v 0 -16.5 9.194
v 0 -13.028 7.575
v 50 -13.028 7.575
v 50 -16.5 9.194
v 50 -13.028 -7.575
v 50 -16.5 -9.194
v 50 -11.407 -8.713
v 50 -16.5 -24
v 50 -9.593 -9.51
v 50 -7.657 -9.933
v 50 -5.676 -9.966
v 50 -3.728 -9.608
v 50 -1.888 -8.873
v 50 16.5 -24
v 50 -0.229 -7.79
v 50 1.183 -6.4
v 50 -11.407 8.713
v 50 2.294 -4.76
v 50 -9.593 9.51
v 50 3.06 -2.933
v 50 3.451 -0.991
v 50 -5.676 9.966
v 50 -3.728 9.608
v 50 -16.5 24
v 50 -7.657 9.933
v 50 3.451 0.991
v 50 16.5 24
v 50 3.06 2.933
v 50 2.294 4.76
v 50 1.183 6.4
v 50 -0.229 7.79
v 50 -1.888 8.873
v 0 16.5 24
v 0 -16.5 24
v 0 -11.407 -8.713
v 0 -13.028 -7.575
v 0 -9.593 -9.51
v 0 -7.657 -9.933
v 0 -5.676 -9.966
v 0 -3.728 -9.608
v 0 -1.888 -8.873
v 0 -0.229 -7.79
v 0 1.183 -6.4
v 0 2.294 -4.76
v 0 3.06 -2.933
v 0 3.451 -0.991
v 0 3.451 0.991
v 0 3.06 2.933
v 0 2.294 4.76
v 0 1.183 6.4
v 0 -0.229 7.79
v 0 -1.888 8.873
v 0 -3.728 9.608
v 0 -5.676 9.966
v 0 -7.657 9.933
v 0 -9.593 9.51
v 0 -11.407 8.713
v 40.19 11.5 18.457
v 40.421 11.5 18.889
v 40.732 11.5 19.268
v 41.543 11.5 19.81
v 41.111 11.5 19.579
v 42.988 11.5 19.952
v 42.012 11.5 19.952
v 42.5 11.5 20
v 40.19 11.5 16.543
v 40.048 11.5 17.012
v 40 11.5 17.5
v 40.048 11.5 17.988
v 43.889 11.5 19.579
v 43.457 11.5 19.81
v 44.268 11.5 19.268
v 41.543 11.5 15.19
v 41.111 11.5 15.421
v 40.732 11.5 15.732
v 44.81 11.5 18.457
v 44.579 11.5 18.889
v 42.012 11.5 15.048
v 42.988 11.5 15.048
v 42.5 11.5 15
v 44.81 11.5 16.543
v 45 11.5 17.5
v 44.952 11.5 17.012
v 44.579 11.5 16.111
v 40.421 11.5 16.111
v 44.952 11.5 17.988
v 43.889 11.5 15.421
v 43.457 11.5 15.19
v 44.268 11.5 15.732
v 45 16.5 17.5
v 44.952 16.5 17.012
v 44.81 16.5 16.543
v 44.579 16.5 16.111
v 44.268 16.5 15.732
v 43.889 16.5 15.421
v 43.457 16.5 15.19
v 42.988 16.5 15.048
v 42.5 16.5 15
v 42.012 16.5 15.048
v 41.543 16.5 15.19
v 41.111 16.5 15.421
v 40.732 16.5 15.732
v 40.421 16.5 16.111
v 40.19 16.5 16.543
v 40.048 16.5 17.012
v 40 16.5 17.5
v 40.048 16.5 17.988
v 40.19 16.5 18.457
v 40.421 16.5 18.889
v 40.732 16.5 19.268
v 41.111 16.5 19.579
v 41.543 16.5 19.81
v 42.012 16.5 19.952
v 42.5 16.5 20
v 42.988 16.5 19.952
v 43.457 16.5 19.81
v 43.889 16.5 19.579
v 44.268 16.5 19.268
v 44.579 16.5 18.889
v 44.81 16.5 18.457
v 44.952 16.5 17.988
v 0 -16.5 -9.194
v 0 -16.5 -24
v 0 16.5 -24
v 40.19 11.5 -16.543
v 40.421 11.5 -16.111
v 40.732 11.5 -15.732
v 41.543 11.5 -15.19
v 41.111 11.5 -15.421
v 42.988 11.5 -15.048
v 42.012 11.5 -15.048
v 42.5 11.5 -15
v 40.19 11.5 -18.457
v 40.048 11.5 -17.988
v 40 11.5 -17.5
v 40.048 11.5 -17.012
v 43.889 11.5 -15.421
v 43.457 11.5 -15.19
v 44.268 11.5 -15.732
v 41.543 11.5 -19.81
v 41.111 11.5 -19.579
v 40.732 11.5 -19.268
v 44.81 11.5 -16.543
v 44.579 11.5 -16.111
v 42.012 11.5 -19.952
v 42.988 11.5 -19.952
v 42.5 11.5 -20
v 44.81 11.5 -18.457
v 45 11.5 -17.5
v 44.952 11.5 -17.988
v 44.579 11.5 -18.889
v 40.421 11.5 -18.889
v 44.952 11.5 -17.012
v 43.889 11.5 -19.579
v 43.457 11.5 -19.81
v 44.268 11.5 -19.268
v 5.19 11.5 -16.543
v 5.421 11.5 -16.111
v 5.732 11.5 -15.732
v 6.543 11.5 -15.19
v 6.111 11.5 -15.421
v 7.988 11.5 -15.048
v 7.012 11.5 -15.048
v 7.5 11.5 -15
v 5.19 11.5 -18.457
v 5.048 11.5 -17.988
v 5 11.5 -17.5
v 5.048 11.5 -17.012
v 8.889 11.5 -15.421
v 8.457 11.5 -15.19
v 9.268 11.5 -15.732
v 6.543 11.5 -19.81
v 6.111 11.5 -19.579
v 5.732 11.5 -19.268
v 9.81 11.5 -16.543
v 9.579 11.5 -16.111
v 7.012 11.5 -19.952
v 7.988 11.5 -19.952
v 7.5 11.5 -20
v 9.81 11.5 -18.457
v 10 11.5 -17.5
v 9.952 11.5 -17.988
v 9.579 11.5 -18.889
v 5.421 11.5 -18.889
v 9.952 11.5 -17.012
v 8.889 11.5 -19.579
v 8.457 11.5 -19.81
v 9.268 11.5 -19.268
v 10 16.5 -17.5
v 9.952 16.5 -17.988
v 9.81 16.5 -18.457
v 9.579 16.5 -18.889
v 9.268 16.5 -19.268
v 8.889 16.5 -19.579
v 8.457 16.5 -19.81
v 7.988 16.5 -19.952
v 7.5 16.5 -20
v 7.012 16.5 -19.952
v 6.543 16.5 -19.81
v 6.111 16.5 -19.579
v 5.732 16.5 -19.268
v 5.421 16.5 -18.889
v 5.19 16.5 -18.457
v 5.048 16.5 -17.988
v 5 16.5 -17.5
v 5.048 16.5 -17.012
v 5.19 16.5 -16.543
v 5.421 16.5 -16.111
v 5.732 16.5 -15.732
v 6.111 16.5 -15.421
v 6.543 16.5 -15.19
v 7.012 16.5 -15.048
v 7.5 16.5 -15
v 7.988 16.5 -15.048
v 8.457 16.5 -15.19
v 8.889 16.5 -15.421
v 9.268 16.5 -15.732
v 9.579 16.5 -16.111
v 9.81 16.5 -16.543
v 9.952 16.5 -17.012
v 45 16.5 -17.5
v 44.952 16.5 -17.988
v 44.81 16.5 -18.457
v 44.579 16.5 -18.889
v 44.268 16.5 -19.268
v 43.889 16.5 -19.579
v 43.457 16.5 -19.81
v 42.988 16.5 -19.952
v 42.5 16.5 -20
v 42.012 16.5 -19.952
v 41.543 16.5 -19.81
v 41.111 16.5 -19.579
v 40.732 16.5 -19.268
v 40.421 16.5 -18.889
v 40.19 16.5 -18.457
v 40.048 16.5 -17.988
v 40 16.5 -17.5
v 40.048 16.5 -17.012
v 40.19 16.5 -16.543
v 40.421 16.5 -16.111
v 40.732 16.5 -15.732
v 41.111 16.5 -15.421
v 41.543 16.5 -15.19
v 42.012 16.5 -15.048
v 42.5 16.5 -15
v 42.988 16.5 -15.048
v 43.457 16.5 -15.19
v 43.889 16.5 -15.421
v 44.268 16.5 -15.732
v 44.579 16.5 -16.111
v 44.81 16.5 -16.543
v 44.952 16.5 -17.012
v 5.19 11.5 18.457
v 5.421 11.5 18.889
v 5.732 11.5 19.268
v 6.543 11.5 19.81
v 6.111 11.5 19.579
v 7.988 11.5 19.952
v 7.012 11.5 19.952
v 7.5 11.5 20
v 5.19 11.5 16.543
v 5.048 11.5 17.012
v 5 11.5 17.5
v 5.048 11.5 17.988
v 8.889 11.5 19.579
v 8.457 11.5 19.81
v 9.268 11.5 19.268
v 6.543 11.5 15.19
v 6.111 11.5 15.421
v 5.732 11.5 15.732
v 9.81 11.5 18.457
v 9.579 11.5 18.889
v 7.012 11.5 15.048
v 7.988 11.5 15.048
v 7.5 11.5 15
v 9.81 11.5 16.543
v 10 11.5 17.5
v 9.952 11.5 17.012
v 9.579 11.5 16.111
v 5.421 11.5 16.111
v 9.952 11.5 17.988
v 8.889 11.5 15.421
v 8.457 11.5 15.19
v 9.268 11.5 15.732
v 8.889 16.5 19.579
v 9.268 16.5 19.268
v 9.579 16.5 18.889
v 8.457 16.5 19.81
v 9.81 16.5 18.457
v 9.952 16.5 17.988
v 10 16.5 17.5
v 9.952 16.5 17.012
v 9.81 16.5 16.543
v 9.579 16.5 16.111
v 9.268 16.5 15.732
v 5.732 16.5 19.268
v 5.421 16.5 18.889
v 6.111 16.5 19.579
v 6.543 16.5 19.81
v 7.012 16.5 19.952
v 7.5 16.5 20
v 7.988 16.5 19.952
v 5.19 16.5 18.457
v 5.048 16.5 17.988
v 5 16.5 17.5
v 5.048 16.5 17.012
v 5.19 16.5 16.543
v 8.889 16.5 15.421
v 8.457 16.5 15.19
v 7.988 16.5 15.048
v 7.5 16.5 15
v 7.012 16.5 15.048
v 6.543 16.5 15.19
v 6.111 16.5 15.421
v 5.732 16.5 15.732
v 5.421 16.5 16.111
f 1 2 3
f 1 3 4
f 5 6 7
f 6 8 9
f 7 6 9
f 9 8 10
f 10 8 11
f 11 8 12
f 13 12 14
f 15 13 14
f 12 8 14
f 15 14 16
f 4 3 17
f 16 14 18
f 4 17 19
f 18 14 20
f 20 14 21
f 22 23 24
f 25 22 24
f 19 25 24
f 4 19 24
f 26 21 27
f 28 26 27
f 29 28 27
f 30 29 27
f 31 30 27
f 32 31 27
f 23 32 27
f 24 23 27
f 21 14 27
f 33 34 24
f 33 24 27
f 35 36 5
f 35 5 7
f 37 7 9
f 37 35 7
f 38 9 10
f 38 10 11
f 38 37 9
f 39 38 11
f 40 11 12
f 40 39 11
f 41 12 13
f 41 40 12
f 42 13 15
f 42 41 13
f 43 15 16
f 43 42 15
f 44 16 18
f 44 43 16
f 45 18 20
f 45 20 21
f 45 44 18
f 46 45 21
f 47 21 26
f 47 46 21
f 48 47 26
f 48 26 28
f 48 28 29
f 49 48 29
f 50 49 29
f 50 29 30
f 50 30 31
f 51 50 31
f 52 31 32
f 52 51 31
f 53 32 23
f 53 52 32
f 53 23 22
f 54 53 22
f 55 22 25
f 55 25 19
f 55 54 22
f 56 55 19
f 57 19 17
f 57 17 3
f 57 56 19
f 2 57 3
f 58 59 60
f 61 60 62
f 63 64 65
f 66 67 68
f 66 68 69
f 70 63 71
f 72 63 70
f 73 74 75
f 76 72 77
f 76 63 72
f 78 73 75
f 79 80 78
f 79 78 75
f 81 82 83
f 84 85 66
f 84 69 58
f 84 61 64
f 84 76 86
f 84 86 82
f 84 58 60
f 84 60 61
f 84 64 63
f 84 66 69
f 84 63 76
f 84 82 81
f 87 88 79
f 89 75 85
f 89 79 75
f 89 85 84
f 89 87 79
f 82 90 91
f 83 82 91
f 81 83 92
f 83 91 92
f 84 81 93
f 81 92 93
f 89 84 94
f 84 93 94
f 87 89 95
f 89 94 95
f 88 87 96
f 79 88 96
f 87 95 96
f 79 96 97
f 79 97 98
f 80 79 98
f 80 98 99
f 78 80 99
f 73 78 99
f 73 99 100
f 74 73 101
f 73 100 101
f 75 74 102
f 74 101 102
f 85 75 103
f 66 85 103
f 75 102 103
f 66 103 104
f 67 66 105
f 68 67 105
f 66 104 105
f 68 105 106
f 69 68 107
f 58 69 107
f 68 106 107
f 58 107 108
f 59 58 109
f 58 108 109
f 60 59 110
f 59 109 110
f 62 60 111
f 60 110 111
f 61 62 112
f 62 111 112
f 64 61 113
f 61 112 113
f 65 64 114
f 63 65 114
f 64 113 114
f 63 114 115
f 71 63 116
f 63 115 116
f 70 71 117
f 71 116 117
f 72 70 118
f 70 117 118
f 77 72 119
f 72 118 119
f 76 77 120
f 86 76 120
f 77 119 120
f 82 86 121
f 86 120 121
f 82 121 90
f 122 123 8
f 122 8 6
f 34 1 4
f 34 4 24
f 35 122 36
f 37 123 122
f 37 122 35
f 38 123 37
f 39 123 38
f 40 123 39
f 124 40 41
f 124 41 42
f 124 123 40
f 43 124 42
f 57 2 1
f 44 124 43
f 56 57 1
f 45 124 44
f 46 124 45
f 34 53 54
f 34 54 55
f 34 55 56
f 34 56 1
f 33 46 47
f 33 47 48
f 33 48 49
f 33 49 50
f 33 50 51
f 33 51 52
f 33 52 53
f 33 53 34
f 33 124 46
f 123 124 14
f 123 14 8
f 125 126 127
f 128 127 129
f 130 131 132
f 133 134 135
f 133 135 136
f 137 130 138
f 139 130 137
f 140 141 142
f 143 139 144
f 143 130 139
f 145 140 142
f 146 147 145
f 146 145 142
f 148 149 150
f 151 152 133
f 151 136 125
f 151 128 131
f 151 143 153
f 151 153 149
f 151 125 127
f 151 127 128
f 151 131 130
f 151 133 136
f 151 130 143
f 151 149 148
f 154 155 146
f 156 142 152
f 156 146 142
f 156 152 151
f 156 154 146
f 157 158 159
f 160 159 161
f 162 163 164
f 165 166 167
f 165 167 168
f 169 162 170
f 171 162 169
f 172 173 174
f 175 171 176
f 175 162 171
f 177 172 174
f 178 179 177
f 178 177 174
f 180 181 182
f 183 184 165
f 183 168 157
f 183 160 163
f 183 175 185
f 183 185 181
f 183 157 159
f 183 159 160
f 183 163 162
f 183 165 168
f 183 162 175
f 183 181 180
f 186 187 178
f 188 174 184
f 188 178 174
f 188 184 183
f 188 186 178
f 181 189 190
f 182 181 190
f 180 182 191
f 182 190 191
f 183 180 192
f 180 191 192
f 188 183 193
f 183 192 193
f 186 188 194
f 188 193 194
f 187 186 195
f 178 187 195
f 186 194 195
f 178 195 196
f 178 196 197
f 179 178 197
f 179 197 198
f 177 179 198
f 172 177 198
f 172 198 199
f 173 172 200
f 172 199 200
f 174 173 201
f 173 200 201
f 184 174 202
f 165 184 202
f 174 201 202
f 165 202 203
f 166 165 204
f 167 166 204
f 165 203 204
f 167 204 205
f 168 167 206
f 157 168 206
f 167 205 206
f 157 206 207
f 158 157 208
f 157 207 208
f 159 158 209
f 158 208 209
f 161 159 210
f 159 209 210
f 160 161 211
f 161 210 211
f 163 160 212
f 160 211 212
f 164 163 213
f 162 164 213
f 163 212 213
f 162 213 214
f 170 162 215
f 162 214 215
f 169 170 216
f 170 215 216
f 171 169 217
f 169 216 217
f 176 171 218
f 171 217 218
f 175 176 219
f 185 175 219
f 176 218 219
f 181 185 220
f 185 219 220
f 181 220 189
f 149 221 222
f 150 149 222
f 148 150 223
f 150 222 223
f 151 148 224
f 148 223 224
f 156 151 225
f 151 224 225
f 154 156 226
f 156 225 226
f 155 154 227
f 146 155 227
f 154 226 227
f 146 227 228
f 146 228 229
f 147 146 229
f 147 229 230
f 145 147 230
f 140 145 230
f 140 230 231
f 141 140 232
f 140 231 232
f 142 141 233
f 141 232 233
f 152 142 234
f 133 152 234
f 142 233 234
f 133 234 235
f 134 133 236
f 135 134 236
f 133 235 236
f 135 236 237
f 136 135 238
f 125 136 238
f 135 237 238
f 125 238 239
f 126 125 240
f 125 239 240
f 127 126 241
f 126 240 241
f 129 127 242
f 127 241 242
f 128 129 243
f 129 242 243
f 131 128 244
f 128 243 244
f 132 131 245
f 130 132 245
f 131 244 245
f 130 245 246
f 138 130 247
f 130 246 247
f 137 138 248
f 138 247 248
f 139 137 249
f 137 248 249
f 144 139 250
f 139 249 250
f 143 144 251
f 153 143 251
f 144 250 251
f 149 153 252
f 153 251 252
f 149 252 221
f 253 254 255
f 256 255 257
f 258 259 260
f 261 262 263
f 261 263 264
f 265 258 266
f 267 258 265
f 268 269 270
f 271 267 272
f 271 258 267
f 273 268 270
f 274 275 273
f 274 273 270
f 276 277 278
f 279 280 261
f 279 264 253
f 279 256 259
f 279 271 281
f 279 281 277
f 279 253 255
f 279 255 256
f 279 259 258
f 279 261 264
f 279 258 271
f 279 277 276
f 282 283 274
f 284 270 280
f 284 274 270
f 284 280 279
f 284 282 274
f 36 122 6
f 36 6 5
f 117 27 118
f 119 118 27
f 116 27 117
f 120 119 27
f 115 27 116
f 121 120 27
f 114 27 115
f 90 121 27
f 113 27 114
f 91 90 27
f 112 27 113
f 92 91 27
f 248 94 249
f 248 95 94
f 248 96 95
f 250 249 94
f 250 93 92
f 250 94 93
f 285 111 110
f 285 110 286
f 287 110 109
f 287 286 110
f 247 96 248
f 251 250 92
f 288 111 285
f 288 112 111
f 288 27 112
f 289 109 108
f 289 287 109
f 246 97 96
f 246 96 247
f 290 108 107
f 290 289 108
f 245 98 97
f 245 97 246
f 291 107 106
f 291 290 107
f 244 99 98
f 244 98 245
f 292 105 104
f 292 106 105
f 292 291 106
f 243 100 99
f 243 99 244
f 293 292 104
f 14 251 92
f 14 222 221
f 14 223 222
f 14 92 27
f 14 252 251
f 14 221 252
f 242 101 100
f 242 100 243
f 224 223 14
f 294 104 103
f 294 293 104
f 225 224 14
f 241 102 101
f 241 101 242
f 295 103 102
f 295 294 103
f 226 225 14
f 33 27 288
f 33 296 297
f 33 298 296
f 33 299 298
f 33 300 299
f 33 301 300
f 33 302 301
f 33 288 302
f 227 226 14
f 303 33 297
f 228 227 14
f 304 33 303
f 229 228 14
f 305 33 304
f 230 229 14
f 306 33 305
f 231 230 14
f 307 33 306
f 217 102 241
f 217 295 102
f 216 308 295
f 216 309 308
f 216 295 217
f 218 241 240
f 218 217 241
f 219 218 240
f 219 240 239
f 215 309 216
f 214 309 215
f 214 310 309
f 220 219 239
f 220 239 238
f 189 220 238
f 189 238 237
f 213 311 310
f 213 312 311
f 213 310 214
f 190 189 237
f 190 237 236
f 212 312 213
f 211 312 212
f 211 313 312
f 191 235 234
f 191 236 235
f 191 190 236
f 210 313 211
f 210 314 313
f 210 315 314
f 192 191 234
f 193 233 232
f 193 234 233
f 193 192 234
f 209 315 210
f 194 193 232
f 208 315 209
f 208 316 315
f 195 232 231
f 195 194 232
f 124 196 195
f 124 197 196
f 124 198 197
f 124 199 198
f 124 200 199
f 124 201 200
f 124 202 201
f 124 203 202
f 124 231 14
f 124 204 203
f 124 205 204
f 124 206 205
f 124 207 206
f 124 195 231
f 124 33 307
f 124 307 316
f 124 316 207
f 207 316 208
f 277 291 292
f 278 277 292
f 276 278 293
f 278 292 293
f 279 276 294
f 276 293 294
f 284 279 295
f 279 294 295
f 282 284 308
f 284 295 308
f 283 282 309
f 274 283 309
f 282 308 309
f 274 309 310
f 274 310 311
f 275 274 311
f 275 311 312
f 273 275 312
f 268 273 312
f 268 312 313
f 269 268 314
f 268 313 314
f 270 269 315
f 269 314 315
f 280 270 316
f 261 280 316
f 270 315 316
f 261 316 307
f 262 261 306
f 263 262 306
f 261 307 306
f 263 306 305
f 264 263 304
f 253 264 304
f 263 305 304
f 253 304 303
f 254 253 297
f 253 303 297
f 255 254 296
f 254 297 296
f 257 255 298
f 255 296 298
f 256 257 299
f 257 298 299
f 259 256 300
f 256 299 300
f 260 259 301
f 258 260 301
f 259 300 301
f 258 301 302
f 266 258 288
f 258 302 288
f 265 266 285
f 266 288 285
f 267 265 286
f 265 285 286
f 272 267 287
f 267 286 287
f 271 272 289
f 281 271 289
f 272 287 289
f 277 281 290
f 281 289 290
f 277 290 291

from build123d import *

# Parameters (mm, degrees)
BOSS_EXTRUDE1_DEPTH = 50
SKETCH2_R           = 2.5
CUT_EXTRUDE1_DEPTH  = 5


with BuildPart() as part:
    # Sketch1 → Boss-Extrude1 (new body)
    with BuildSketch(Plane(origin=(0, 0, 0), x_dir=(0, 0, -1), z_dir=(1, 0, 0))):
        with BuildLine():
            Line((24, -16.5), (9.19407636, -16.5))
            Line((9.19407636, -16.5), (7.575142847, -13.028185878))
            ThreePointArc((7.575142847, -13.028185878), (0, 3.5), (-7.575142847, -13.028185878))
            Line((-7.575142847, -13.028185878), (-9.19407636, -16.5))
            Line((-9.19407636, -16.5), (-24, -16.5))
            Line((-24, -16.5), (-24, 16.5))
            Line((-24, 16.5), (24, 16.5))
            Line((24, 16.5), (24, -16.5))
        make_face()
    extrude(amount=BOSS_EXTRUDE1_DEPTH)

    # Sketch2 → Cut-Extrude1 (cut)
    with BuildSketch(Plane(origin=(0, 16.5, 0), x_dir=(1, 0, 0), z_dir=(0, 1, 0))):
        with Locations((7.5, 17.5)):
            Circle(SKETCH2_R)
        with Locations((42.5, 17.5)):
            Circle(SKETCH2_R)
        with Locations((42.5, -17.5)):
            Circle(SKETCH2_R)
        with Locations((7.5, -17.5)):
            Circle(SKETCH2_R)
    extrude(amount=-CUT_EXTRUDE1_DEPTH, mode=Mode.SUBTRACT)


solid = part.part
